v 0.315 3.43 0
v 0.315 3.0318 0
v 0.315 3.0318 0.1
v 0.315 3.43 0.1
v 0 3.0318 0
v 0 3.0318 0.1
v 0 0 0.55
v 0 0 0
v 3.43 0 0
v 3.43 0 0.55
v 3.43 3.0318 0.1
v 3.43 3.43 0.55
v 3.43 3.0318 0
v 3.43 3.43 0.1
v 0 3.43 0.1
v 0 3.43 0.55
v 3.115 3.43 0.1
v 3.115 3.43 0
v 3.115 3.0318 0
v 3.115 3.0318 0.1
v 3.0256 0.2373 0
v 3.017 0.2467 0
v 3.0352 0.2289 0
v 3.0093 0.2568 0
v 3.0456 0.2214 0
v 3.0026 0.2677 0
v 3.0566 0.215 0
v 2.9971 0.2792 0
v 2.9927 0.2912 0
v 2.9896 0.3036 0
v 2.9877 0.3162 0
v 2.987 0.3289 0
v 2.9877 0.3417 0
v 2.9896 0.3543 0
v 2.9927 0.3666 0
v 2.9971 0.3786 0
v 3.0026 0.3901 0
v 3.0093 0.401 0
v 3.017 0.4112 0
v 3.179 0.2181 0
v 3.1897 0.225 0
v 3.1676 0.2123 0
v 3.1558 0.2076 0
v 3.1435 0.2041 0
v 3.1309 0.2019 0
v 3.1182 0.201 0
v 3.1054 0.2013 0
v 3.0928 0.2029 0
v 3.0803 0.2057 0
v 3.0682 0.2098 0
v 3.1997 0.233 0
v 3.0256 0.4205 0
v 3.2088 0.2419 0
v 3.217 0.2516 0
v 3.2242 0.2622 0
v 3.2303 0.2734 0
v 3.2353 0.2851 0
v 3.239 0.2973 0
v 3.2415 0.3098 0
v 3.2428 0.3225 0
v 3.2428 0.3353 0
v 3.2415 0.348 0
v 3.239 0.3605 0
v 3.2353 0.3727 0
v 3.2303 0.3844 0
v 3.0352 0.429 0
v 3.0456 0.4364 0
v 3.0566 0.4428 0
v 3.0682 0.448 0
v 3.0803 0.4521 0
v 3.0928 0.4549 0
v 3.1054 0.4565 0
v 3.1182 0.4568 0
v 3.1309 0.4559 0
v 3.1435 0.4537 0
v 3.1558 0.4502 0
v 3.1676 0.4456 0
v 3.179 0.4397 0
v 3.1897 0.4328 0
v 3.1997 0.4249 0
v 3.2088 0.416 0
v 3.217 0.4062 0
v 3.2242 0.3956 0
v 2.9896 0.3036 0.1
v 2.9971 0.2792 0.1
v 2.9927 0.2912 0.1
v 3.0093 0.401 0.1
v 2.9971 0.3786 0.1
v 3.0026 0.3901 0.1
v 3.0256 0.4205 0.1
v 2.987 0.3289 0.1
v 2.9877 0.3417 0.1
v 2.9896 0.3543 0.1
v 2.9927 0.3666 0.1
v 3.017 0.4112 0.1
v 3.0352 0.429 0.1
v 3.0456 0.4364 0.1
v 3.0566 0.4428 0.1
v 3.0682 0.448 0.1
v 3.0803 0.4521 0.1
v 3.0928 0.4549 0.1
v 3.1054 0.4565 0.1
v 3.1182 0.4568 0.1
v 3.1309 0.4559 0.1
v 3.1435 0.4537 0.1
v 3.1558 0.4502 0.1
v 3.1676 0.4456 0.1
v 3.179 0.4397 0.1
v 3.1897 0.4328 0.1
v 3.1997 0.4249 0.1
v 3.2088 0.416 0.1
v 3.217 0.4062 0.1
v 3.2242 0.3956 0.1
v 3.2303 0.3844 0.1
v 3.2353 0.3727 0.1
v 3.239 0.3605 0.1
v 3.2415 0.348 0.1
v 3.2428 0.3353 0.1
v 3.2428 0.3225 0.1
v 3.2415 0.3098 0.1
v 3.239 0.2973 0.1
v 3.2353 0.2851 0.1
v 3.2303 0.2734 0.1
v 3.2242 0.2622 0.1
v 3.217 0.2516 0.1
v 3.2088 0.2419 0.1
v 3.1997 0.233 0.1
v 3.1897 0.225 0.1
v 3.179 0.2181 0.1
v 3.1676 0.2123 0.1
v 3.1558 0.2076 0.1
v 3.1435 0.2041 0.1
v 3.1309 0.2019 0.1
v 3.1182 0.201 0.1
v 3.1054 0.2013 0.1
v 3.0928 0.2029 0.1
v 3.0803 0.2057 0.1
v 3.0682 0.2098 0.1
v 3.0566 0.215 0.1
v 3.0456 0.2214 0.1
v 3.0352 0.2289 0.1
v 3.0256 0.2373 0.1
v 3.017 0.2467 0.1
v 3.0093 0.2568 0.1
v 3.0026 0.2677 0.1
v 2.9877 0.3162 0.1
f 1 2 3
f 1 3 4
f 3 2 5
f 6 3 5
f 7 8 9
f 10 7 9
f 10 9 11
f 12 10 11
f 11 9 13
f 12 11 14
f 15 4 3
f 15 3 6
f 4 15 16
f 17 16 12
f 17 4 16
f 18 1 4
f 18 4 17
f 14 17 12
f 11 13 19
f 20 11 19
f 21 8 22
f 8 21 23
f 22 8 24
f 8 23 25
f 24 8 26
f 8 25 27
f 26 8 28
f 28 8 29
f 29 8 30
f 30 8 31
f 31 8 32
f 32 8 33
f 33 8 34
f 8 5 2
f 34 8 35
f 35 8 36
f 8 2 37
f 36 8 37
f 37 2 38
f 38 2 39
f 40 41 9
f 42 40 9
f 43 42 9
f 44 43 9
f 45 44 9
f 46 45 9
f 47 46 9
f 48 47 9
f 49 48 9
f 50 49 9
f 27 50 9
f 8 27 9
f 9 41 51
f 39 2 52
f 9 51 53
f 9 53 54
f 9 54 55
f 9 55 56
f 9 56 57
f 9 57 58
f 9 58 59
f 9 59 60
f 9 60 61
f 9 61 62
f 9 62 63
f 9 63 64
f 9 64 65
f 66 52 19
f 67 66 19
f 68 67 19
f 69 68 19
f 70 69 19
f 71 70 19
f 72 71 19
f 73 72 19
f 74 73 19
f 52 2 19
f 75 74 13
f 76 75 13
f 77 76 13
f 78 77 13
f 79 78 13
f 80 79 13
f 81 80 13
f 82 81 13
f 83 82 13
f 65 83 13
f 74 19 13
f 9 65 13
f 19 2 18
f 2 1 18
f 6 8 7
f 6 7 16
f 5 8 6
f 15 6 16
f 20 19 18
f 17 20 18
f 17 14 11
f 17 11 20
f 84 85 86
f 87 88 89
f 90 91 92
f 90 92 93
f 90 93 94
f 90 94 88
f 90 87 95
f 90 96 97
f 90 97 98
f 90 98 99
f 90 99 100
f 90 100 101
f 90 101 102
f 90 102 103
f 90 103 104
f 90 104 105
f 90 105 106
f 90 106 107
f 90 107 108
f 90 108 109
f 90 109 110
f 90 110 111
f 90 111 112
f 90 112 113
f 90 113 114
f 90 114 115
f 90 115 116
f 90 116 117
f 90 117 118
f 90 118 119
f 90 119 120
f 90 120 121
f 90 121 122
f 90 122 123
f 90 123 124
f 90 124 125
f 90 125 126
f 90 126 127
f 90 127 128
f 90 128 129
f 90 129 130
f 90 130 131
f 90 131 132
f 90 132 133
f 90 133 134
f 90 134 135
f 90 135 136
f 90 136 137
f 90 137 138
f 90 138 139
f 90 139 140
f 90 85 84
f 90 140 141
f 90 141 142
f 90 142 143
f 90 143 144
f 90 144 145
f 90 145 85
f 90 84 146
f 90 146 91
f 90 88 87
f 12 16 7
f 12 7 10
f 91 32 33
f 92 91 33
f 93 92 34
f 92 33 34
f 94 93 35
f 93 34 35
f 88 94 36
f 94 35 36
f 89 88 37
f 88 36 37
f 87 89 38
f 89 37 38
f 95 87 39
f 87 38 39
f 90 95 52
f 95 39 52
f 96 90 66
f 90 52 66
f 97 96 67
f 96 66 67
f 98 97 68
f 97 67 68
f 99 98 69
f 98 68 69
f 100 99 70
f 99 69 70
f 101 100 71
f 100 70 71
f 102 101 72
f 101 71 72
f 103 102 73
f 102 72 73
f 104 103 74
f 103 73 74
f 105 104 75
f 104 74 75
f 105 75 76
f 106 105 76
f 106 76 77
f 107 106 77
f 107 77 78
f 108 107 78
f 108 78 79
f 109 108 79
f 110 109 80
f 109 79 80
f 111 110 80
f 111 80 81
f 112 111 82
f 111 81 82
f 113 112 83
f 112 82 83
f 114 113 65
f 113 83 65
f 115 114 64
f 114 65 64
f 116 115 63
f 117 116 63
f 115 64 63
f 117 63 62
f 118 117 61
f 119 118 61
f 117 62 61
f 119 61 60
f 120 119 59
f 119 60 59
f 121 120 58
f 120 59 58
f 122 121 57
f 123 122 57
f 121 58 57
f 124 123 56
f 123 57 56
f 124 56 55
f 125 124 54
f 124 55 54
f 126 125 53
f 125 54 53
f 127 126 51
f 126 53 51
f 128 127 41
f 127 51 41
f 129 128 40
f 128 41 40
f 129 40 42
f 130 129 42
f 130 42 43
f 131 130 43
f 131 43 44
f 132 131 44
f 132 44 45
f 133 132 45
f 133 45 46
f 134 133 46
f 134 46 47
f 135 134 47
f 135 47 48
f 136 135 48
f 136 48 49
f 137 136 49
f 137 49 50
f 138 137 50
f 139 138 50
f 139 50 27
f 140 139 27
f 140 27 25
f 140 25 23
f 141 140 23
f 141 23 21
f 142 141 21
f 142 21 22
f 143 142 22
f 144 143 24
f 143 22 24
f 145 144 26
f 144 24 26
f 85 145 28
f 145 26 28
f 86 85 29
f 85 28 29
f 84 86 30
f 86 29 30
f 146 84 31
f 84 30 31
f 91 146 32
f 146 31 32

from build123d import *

# Parameters (mm, degrees)
SKETCH1_W           = 3.43
SKETCH1_H           = 3.43
BOSS_EXTRUDE1_DEPTH = 0.55
SKETCH3_R           = 0.127973113
SKETCH3_W           = 0.315
SKETCH3_H           = 0.398213576
CUT_EXTRUDE1_DEPTH  = 0.1


with BuildPart() as part:
    # Sketch1 → Boss-Extrude1 (new body)
    with BuildSketch(Plane.XY):
        with Locations((1.715, 1.715)):
            Rectangle(SKETCH1_W, SKETCH1_H)
    extrude(amount=BOSS_EXTRUDE1_DEPTH)

    # Sketch3 → Cut-Extrude1 (cut)
    with BuildSketch(Plane(origin=(0, 0, 0), x_dir=(-1, 0, 0), z_dir=(0, 0, -1))):
        with Locations((-3.115, 0.328910616)):
            Circle(SKETCH3_R)
        with Locations((-3.2725, 3.230893212)):
            Rectangle(SKETCH3_W, SKETCH3_H)
        with Locations((-0.1575, 3.230893212)):
            Rectangle(SKETCH3_W, SKETCH3_H)
    extrude(amount=-CUT_EXTRUDE1_DEPTH, mode=Mode.SUBTRACT)


solid = part.part
